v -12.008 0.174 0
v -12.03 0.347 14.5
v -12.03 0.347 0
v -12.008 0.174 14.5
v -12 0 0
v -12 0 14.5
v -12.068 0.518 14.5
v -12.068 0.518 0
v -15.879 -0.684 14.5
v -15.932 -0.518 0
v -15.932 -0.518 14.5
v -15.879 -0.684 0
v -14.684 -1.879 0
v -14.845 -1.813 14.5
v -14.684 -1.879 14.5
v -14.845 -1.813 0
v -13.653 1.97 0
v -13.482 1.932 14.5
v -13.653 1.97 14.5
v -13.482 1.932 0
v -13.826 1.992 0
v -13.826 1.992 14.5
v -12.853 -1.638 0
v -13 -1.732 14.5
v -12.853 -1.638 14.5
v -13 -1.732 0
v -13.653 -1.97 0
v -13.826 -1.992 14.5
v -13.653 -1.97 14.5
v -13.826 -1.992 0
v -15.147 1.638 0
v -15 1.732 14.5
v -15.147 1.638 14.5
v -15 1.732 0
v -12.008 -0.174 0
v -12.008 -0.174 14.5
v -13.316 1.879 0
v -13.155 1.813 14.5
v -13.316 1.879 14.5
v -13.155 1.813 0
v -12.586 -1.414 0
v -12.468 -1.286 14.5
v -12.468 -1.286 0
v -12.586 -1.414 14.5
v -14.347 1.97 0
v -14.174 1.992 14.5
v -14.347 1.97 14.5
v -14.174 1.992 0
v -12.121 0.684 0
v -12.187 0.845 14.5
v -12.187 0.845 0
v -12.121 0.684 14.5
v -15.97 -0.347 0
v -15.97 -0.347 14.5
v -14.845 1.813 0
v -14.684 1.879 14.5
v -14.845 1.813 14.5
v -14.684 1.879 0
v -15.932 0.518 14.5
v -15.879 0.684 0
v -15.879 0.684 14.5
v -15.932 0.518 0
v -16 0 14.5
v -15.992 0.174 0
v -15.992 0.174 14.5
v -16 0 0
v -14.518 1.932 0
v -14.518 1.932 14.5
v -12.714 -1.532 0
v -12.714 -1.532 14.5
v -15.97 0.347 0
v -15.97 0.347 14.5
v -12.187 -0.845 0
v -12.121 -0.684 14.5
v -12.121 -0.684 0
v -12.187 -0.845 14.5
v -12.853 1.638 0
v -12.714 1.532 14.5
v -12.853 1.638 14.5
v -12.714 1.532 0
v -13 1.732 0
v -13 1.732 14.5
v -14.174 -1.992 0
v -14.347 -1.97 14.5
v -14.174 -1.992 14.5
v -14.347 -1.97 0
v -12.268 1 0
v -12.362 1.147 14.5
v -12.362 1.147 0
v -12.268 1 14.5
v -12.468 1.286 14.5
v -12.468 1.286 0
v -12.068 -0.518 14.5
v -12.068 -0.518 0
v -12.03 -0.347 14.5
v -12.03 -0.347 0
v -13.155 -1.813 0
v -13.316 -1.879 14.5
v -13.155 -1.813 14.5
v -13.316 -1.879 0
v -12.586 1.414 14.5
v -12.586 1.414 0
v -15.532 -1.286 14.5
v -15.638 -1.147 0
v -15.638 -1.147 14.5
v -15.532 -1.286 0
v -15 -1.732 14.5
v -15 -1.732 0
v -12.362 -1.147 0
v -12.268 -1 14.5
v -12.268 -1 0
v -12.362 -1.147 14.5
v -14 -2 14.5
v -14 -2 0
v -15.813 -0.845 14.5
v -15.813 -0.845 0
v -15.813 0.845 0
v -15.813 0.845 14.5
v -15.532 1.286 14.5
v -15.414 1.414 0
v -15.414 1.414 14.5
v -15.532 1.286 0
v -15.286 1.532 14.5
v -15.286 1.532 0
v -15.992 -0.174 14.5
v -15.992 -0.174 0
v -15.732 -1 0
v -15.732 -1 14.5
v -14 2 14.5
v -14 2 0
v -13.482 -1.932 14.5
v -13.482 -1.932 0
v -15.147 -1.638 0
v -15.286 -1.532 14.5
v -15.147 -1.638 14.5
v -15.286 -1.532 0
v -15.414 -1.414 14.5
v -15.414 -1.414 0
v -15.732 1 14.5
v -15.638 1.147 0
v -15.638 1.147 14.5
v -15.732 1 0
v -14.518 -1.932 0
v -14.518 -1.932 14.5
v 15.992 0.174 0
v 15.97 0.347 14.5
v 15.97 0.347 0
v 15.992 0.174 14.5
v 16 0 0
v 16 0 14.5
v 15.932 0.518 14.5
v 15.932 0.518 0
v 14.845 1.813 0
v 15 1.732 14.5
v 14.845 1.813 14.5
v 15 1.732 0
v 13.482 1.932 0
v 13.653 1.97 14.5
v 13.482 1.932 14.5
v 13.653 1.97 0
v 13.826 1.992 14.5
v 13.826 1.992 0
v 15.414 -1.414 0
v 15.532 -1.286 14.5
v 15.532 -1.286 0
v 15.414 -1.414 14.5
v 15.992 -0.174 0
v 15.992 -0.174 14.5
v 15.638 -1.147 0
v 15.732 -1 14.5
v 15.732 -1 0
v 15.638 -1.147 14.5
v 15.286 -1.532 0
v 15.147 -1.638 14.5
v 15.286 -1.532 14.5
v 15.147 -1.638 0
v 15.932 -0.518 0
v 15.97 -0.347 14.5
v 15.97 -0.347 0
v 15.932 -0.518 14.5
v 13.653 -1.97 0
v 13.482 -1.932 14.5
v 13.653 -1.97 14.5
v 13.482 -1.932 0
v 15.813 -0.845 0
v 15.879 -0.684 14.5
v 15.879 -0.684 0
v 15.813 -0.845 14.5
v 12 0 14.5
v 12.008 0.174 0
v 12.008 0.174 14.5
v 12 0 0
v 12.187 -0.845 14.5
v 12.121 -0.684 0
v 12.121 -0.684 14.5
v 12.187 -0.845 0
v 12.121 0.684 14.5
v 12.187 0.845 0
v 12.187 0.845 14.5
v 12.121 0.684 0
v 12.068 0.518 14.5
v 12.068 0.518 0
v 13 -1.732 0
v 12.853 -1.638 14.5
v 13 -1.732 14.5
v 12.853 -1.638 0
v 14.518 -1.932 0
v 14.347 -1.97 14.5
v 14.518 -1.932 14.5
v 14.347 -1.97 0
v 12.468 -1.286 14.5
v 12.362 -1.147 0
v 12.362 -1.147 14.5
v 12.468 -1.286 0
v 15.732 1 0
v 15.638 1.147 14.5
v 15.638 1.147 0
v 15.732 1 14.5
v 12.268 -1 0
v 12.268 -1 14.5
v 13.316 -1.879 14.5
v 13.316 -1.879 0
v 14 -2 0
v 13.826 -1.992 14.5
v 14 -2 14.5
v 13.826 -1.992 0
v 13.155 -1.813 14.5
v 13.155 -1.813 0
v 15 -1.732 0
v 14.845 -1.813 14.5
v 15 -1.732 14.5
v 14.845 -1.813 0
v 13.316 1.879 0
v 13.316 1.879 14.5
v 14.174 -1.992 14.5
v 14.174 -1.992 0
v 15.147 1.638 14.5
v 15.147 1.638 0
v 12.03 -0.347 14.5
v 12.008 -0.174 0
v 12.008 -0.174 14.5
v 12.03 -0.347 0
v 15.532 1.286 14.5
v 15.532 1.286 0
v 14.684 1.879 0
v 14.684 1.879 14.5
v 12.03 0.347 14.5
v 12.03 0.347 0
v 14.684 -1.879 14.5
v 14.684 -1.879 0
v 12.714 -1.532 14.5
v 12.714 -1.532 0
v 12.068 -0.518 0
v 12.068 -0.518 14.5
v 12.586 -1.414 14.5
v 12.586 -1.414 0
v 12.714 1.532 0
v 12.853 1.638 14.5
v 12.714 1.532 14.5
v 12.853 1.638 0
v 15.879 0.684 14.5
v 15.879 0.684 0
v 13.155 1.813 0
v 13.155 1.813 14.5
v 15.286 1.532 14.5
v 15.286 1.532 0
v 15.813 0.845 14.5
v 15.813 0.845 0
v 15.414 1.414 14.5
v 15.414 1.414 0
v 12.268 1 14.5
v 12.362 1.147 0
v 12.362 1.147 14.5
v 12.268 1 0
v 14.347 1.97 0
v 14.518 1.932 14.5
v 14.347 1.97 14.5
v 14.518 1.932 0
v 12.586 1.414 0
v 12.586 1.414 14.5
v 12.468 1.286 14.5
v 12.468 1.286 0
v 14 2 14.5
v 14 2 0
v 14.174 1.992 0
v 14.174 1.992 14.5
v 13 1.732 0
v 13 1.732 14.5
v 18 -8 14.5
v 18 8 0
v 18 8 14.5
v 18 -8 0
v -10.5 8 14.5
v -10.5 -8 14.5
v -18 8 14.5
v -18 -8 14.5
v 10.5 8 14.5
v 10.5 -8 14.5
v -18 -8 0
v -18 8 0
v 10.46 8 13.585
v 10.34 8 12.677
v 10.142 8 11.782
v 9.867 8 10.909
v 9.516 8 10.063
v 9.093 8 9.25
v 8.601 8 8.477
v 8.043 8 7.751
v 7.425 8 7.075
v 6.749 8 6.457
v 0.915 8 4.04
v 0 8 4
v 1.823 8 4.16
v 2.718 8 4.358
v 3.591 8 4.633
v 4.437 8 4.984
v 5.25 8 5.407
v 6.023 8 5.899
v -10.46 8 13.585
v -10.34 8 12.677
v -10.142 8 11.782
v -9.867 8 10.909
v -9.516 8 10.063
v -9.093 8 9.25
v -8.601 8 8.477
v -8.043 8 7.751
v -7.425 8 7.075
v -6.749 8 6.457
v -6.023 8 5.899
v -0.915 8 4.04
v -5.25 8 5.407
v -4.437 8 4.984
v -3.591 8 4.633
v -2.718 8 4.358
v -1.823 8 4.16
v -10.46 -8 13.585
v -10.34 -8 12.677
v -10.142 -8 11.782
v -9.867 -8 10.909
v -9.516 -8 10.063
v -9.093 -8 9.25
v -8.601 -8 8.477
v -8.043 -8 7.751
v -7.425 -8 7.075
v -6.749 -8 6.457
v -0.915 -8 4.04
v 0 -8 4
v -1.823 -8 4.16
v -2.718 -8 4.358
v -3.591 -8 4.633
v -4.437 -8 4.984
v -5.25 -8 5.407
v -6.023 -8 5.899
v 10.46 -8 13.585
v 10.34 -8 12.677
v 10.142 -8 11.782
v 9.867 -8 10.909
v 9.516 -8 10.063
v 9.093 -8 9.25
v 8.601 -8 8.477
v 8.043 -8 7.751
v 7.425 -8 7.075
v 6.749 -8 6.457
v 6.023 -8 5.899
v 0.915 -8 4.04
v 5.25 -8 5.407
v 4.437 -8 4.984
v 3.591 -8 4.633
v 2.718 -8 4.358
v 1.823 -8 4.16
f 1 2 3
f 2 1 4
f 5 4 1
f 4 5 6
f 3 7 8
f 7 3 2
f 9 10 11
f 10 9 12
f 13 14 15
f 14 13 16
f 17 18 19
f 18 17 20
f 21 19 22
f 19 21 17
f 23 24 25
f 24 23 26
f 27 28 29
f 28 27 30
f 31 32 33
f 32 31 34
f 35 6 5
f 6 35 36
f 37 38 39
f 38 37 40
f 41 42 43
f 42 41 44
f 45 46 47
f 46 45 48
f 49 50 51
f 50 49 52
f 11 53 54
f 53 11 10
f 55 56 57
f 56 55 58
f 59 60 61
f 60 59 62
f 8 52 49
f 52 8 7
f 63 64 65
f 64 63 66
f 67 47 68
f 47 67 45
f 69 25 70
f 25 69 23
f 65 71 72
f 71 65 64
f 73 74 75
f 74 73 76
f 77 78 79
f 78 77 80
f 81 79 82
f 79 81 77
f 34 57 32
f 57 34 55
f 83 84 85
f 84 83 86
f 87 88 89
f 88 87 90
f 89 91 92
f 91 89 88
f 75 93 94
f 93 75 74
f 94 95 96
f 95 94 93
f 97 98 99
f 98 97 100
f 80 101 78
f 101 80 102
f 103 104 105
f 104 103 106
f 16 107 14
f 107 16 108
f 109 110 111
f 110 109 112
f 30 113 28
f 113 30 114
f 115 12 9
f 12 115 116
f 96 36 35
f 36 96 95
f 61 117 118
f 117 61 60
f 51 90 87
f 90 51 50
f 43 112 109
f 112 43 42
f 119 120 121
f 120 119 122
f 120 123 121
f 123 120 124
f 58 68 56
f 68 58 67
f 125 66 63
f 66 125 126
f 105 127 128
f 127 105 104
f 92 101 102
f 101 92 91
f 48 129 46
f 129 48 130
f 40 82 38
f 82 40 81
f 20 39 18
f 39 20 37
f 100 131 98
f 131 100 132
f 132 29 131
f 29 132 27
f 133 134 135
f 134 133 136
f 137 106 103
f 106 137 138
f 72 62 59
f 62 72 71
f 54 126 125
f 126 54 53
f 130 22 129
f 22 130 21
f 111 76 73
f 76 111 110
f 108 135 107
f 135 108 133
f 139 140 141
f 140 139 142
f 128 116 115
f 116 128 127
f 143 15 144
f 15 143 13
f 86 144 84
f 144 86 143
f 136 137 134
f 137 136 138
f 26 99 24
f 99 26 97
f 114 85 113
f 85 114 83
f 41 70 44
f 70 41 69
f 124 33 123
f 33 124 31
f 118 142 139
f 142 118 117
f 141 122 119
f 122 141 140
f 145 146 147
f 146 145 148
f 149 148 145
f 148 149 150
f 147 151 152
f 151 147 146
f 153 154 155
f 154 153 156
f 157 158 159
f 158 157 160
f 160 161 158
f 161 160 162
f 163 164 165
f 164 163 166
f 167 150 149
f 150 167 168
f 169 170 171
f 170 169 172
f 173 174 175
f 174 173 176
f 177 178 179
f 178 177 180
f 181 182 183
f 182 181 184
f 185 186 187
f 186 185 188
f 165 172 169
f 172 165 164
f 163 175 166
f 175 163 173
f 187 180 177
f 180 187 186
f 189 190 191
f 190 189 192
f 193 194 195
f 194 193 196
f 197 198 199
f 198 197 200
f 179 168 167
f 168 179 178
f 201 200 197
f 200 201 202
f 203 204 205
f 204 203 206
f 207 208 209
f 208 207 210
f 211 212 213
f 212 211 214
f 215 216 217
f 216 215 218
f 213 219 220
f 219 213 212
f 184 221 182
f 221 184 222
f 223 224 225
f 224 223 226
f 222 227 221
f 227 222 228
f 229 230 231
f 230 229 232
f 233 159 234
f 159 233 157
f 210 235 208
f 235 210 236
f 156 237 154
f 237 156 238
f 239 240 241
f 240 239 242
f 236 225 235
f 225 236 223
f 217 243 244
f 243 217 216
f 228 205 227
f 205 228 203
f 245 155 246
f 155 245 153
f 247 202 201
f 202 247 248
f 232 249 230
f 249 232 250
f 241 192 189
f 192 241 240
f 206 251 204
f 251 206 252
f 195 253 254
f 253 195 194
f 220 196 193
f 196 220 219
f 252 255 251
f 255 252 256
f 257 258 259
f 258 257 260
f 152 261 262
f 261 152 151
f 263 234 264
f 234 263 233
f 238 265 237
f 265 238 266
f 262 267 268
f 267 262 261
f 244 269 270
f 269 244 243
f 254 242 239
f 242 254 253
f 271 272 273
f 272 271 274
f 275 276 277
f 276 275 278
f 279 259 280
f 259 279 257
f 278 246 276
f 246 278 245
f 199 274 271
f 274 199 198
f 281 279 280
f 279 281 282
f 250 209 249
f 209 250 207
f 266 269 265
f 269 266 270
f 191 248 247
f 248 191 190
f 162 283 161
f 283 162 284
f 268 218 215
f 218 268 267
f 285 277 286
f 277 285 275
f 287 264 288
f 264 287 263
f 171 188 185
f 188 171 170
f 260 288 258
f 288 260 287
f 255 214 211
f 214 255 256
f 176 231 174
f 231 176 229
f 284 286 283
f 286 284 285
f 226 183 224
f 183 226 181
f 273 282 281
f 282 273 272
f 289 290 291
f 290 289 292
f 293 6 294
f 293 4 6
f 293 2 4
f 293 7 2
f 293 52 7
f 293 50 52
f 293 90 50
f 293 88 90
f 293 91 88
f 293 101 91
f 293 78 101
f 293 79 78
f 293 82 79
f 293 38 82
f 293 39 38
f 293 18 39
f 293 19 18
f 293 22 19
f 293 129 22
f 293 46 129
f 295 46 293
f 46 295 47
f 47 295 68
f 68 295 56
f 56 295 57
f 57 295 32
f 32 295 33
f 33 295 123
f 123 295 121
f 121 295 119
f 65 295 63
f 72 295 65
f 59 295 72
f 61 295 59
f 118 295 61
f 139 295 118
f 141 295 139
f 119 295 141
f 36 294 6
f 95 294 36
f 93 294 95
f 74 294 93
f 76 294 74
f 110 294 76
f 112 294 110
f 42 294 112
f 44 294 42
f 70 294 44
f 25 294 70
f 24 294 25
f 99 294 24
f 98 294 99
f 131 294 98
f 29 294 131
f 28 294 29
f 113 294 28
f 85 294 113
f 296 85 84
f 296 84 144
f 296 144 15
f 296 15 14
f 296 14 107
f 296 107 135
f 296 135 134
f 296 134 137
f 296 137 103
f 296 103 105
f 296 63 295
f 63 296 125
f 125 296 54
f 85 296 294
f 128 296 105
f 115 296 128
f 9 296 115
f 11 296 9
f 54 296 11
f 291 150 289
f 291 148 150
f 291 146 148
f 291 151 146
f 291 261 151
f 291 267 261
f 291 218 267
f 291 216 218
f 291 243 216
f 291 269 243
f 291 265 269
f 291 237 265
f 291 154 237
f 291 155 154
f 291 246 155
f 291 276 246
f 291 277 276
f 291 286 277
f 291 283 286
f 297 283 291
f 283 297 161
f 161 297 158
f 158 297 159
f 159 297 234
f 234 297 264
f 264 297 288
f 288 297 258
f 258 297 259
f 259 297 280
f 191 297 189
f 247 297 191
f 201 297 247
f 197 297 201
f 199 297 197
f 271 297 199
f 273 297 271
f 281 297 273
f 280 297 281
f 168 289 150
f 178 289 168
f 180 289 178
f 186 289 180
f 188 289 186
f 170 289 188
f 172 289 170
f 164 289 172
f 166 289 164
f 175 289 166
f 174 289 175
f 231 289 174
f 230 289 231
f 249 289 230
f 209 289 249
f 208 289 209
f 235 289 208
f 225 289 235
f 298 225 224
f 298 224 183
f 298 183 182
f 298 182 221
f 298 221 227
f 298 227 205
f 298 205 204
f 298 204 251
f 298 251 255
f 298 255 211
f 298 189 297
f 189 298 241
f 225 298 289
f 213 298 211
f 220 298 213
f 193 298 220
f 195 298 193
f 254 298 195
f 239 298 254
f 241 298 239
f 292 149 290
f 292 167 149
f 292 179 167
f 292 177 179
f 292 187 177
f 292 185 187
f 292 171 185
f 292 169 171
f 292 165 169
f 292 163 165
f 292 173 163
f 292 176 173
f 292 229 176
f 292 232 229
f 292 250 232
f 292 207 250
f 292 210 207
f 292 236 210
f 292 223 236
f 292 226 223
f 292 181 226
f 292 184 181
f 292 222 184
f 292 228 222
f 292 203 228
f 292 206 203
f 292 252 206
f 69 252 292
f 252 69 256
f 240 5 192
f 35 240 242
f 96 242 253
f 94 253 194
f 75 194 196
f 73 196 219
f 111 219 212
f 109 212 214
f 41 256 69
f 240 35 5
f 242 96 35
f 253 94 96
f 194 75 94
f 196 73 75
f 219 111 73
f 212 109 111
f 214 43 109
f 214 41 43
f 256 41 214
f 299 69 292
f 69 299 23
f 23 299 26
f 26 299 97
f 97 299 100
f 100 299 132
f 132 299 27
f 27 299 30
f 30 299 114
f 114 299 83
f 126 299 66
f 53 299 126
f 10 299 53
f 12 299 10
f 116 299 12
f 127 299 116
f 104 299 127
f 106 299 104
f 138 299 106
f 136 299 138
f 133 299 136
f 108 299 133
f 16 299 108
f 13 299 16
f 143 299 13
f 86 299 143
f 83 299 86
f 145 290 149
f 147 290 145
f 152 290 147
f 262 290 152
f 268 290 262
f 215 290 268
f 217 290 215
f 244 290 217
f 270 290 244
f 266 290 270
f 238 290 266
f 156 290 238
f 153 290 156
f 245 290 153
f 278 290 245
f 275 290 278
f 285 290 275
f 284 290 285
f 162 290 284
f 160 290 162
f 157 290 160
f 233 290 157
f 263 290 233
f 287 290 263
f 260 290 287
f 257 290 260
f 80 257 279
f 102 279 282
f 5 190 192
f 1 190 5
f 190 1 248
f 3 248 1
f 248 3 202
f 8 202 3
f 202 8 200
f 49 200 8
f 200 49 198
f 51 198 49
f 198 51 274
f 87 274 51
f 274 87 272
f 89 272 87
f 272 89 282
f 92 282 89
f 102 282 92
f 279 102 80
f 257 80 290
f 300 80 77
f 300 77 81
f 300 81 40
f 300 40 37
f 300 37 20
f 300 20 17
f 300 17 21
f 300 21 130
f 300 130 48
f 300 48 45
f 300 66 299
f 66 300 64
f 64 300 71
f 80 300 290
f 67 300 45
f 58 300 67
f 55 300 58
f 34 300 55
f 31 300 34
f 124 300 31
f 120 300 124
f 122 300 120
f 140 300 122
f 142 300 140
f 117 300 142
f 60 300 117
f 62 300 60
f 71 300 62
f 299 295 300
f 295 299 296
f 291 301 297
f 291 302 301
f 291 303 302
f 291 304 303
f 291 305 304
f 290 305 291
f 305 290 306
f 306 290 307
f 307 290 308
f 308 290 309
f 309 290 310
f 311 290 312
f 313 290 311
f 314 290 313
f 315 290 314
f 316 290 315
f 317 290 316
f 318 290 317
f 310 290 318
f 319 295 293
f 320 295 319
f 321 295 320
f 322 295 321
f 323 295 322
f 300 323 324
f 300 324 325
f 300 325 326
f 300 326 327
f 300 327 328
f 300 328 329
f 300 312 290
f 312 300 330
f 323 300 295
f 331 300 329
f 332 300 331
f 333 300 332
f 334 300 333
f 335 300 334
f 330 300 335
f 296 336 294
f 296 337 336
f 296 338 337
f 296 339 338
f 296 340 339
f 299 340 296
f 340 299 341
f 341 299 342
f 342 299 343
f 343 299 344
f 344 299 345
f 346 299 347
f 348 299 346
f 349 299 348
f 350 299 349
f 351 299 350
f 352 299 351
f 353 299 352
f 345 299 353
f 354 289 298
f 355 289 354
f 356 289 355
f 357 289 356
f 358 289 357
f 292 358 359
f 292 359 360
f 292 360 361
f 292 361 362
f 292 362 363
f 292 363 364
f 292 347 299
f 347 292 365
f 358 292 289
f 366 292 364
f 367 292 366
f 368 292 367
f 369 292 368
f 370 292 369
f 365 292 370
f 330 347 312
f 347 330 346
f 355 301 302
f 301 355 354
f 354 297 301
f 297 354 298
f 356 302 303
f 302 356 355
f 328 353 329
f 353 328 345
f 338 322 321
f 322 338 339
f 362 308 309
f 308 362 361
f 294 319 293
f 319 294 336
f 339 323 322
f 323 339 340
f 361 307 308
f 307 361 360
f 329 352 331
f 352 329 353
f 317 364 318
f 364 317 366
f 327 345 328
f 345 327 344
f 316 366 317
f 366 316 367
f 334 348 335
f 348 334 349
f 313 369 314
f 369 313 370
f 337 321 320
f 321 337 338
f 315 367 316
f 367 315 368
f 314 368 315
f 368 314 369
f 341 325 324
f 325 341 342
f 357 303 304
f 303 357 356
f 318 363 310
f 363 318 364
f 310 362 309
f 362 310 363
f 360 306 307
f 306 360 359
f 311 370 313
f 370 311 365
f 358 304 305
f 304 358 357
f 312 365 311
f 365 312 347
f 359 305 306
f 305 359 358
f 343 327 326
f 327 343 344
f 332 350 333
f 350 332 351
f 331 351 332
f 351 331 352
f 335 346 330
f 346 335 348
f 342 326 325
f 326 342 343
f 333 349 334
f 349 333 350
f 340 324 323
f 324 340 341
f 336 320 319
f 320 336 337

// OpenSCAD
// Pipe saddle clamp - a block with a semicircular groove that cradles a round pipe or
// rod against a flat surface, with a bolt hole each side to screw it down. NOVEL part.
//
// @desc pipe saddle clamp that fixes a round pipe or rod to a flat surface
// @prompt Design a pipe saddle clamp in OpenSCAD: a block with a semicircular groove that cradles a {pipe_d} mm diameter pipe against a surface, with a {bolt_d} mm bolt hole on each side to screw it down. Reply with a single complete OpenSCAD file.
// @param pipe_d  pipe outer diameter, mm            [8:50]
// @param bolt_d  bolt hole diameter, mm             [3:8]
// @param base_t  floor thickness under the groove, mm   [3:8]

pipe_d = 20;
bolt_d = 4;
base_t = 4;

$fn = 72;

sr     = pipe_d / 2 + 0.5;          // groove radius, with a little clearance
L      = 16;                        // length along the pipe axis
margin = bolt_d + 4;
w      = pipe_d + 2 * margin;       // overall width
h      = base_t + sr;               // block height so the groove centre sits at the top

difference() {
    translate([-w / 2, -L / 2, 0]) cube([w, L, h]);
    translate([0, -L / 2 - 1, h]) rotate([-90, 0, 0]) cylinder(h = L + 2, r = sr);   // groove
    for (x = [-(pipe_d / 2 + margin / 2), pipe_d / 2 + margin / 2])
        translate([x, 0, -1]) cylinder(h = h + 2, d = bolt_d);                        // bolt holes
}
